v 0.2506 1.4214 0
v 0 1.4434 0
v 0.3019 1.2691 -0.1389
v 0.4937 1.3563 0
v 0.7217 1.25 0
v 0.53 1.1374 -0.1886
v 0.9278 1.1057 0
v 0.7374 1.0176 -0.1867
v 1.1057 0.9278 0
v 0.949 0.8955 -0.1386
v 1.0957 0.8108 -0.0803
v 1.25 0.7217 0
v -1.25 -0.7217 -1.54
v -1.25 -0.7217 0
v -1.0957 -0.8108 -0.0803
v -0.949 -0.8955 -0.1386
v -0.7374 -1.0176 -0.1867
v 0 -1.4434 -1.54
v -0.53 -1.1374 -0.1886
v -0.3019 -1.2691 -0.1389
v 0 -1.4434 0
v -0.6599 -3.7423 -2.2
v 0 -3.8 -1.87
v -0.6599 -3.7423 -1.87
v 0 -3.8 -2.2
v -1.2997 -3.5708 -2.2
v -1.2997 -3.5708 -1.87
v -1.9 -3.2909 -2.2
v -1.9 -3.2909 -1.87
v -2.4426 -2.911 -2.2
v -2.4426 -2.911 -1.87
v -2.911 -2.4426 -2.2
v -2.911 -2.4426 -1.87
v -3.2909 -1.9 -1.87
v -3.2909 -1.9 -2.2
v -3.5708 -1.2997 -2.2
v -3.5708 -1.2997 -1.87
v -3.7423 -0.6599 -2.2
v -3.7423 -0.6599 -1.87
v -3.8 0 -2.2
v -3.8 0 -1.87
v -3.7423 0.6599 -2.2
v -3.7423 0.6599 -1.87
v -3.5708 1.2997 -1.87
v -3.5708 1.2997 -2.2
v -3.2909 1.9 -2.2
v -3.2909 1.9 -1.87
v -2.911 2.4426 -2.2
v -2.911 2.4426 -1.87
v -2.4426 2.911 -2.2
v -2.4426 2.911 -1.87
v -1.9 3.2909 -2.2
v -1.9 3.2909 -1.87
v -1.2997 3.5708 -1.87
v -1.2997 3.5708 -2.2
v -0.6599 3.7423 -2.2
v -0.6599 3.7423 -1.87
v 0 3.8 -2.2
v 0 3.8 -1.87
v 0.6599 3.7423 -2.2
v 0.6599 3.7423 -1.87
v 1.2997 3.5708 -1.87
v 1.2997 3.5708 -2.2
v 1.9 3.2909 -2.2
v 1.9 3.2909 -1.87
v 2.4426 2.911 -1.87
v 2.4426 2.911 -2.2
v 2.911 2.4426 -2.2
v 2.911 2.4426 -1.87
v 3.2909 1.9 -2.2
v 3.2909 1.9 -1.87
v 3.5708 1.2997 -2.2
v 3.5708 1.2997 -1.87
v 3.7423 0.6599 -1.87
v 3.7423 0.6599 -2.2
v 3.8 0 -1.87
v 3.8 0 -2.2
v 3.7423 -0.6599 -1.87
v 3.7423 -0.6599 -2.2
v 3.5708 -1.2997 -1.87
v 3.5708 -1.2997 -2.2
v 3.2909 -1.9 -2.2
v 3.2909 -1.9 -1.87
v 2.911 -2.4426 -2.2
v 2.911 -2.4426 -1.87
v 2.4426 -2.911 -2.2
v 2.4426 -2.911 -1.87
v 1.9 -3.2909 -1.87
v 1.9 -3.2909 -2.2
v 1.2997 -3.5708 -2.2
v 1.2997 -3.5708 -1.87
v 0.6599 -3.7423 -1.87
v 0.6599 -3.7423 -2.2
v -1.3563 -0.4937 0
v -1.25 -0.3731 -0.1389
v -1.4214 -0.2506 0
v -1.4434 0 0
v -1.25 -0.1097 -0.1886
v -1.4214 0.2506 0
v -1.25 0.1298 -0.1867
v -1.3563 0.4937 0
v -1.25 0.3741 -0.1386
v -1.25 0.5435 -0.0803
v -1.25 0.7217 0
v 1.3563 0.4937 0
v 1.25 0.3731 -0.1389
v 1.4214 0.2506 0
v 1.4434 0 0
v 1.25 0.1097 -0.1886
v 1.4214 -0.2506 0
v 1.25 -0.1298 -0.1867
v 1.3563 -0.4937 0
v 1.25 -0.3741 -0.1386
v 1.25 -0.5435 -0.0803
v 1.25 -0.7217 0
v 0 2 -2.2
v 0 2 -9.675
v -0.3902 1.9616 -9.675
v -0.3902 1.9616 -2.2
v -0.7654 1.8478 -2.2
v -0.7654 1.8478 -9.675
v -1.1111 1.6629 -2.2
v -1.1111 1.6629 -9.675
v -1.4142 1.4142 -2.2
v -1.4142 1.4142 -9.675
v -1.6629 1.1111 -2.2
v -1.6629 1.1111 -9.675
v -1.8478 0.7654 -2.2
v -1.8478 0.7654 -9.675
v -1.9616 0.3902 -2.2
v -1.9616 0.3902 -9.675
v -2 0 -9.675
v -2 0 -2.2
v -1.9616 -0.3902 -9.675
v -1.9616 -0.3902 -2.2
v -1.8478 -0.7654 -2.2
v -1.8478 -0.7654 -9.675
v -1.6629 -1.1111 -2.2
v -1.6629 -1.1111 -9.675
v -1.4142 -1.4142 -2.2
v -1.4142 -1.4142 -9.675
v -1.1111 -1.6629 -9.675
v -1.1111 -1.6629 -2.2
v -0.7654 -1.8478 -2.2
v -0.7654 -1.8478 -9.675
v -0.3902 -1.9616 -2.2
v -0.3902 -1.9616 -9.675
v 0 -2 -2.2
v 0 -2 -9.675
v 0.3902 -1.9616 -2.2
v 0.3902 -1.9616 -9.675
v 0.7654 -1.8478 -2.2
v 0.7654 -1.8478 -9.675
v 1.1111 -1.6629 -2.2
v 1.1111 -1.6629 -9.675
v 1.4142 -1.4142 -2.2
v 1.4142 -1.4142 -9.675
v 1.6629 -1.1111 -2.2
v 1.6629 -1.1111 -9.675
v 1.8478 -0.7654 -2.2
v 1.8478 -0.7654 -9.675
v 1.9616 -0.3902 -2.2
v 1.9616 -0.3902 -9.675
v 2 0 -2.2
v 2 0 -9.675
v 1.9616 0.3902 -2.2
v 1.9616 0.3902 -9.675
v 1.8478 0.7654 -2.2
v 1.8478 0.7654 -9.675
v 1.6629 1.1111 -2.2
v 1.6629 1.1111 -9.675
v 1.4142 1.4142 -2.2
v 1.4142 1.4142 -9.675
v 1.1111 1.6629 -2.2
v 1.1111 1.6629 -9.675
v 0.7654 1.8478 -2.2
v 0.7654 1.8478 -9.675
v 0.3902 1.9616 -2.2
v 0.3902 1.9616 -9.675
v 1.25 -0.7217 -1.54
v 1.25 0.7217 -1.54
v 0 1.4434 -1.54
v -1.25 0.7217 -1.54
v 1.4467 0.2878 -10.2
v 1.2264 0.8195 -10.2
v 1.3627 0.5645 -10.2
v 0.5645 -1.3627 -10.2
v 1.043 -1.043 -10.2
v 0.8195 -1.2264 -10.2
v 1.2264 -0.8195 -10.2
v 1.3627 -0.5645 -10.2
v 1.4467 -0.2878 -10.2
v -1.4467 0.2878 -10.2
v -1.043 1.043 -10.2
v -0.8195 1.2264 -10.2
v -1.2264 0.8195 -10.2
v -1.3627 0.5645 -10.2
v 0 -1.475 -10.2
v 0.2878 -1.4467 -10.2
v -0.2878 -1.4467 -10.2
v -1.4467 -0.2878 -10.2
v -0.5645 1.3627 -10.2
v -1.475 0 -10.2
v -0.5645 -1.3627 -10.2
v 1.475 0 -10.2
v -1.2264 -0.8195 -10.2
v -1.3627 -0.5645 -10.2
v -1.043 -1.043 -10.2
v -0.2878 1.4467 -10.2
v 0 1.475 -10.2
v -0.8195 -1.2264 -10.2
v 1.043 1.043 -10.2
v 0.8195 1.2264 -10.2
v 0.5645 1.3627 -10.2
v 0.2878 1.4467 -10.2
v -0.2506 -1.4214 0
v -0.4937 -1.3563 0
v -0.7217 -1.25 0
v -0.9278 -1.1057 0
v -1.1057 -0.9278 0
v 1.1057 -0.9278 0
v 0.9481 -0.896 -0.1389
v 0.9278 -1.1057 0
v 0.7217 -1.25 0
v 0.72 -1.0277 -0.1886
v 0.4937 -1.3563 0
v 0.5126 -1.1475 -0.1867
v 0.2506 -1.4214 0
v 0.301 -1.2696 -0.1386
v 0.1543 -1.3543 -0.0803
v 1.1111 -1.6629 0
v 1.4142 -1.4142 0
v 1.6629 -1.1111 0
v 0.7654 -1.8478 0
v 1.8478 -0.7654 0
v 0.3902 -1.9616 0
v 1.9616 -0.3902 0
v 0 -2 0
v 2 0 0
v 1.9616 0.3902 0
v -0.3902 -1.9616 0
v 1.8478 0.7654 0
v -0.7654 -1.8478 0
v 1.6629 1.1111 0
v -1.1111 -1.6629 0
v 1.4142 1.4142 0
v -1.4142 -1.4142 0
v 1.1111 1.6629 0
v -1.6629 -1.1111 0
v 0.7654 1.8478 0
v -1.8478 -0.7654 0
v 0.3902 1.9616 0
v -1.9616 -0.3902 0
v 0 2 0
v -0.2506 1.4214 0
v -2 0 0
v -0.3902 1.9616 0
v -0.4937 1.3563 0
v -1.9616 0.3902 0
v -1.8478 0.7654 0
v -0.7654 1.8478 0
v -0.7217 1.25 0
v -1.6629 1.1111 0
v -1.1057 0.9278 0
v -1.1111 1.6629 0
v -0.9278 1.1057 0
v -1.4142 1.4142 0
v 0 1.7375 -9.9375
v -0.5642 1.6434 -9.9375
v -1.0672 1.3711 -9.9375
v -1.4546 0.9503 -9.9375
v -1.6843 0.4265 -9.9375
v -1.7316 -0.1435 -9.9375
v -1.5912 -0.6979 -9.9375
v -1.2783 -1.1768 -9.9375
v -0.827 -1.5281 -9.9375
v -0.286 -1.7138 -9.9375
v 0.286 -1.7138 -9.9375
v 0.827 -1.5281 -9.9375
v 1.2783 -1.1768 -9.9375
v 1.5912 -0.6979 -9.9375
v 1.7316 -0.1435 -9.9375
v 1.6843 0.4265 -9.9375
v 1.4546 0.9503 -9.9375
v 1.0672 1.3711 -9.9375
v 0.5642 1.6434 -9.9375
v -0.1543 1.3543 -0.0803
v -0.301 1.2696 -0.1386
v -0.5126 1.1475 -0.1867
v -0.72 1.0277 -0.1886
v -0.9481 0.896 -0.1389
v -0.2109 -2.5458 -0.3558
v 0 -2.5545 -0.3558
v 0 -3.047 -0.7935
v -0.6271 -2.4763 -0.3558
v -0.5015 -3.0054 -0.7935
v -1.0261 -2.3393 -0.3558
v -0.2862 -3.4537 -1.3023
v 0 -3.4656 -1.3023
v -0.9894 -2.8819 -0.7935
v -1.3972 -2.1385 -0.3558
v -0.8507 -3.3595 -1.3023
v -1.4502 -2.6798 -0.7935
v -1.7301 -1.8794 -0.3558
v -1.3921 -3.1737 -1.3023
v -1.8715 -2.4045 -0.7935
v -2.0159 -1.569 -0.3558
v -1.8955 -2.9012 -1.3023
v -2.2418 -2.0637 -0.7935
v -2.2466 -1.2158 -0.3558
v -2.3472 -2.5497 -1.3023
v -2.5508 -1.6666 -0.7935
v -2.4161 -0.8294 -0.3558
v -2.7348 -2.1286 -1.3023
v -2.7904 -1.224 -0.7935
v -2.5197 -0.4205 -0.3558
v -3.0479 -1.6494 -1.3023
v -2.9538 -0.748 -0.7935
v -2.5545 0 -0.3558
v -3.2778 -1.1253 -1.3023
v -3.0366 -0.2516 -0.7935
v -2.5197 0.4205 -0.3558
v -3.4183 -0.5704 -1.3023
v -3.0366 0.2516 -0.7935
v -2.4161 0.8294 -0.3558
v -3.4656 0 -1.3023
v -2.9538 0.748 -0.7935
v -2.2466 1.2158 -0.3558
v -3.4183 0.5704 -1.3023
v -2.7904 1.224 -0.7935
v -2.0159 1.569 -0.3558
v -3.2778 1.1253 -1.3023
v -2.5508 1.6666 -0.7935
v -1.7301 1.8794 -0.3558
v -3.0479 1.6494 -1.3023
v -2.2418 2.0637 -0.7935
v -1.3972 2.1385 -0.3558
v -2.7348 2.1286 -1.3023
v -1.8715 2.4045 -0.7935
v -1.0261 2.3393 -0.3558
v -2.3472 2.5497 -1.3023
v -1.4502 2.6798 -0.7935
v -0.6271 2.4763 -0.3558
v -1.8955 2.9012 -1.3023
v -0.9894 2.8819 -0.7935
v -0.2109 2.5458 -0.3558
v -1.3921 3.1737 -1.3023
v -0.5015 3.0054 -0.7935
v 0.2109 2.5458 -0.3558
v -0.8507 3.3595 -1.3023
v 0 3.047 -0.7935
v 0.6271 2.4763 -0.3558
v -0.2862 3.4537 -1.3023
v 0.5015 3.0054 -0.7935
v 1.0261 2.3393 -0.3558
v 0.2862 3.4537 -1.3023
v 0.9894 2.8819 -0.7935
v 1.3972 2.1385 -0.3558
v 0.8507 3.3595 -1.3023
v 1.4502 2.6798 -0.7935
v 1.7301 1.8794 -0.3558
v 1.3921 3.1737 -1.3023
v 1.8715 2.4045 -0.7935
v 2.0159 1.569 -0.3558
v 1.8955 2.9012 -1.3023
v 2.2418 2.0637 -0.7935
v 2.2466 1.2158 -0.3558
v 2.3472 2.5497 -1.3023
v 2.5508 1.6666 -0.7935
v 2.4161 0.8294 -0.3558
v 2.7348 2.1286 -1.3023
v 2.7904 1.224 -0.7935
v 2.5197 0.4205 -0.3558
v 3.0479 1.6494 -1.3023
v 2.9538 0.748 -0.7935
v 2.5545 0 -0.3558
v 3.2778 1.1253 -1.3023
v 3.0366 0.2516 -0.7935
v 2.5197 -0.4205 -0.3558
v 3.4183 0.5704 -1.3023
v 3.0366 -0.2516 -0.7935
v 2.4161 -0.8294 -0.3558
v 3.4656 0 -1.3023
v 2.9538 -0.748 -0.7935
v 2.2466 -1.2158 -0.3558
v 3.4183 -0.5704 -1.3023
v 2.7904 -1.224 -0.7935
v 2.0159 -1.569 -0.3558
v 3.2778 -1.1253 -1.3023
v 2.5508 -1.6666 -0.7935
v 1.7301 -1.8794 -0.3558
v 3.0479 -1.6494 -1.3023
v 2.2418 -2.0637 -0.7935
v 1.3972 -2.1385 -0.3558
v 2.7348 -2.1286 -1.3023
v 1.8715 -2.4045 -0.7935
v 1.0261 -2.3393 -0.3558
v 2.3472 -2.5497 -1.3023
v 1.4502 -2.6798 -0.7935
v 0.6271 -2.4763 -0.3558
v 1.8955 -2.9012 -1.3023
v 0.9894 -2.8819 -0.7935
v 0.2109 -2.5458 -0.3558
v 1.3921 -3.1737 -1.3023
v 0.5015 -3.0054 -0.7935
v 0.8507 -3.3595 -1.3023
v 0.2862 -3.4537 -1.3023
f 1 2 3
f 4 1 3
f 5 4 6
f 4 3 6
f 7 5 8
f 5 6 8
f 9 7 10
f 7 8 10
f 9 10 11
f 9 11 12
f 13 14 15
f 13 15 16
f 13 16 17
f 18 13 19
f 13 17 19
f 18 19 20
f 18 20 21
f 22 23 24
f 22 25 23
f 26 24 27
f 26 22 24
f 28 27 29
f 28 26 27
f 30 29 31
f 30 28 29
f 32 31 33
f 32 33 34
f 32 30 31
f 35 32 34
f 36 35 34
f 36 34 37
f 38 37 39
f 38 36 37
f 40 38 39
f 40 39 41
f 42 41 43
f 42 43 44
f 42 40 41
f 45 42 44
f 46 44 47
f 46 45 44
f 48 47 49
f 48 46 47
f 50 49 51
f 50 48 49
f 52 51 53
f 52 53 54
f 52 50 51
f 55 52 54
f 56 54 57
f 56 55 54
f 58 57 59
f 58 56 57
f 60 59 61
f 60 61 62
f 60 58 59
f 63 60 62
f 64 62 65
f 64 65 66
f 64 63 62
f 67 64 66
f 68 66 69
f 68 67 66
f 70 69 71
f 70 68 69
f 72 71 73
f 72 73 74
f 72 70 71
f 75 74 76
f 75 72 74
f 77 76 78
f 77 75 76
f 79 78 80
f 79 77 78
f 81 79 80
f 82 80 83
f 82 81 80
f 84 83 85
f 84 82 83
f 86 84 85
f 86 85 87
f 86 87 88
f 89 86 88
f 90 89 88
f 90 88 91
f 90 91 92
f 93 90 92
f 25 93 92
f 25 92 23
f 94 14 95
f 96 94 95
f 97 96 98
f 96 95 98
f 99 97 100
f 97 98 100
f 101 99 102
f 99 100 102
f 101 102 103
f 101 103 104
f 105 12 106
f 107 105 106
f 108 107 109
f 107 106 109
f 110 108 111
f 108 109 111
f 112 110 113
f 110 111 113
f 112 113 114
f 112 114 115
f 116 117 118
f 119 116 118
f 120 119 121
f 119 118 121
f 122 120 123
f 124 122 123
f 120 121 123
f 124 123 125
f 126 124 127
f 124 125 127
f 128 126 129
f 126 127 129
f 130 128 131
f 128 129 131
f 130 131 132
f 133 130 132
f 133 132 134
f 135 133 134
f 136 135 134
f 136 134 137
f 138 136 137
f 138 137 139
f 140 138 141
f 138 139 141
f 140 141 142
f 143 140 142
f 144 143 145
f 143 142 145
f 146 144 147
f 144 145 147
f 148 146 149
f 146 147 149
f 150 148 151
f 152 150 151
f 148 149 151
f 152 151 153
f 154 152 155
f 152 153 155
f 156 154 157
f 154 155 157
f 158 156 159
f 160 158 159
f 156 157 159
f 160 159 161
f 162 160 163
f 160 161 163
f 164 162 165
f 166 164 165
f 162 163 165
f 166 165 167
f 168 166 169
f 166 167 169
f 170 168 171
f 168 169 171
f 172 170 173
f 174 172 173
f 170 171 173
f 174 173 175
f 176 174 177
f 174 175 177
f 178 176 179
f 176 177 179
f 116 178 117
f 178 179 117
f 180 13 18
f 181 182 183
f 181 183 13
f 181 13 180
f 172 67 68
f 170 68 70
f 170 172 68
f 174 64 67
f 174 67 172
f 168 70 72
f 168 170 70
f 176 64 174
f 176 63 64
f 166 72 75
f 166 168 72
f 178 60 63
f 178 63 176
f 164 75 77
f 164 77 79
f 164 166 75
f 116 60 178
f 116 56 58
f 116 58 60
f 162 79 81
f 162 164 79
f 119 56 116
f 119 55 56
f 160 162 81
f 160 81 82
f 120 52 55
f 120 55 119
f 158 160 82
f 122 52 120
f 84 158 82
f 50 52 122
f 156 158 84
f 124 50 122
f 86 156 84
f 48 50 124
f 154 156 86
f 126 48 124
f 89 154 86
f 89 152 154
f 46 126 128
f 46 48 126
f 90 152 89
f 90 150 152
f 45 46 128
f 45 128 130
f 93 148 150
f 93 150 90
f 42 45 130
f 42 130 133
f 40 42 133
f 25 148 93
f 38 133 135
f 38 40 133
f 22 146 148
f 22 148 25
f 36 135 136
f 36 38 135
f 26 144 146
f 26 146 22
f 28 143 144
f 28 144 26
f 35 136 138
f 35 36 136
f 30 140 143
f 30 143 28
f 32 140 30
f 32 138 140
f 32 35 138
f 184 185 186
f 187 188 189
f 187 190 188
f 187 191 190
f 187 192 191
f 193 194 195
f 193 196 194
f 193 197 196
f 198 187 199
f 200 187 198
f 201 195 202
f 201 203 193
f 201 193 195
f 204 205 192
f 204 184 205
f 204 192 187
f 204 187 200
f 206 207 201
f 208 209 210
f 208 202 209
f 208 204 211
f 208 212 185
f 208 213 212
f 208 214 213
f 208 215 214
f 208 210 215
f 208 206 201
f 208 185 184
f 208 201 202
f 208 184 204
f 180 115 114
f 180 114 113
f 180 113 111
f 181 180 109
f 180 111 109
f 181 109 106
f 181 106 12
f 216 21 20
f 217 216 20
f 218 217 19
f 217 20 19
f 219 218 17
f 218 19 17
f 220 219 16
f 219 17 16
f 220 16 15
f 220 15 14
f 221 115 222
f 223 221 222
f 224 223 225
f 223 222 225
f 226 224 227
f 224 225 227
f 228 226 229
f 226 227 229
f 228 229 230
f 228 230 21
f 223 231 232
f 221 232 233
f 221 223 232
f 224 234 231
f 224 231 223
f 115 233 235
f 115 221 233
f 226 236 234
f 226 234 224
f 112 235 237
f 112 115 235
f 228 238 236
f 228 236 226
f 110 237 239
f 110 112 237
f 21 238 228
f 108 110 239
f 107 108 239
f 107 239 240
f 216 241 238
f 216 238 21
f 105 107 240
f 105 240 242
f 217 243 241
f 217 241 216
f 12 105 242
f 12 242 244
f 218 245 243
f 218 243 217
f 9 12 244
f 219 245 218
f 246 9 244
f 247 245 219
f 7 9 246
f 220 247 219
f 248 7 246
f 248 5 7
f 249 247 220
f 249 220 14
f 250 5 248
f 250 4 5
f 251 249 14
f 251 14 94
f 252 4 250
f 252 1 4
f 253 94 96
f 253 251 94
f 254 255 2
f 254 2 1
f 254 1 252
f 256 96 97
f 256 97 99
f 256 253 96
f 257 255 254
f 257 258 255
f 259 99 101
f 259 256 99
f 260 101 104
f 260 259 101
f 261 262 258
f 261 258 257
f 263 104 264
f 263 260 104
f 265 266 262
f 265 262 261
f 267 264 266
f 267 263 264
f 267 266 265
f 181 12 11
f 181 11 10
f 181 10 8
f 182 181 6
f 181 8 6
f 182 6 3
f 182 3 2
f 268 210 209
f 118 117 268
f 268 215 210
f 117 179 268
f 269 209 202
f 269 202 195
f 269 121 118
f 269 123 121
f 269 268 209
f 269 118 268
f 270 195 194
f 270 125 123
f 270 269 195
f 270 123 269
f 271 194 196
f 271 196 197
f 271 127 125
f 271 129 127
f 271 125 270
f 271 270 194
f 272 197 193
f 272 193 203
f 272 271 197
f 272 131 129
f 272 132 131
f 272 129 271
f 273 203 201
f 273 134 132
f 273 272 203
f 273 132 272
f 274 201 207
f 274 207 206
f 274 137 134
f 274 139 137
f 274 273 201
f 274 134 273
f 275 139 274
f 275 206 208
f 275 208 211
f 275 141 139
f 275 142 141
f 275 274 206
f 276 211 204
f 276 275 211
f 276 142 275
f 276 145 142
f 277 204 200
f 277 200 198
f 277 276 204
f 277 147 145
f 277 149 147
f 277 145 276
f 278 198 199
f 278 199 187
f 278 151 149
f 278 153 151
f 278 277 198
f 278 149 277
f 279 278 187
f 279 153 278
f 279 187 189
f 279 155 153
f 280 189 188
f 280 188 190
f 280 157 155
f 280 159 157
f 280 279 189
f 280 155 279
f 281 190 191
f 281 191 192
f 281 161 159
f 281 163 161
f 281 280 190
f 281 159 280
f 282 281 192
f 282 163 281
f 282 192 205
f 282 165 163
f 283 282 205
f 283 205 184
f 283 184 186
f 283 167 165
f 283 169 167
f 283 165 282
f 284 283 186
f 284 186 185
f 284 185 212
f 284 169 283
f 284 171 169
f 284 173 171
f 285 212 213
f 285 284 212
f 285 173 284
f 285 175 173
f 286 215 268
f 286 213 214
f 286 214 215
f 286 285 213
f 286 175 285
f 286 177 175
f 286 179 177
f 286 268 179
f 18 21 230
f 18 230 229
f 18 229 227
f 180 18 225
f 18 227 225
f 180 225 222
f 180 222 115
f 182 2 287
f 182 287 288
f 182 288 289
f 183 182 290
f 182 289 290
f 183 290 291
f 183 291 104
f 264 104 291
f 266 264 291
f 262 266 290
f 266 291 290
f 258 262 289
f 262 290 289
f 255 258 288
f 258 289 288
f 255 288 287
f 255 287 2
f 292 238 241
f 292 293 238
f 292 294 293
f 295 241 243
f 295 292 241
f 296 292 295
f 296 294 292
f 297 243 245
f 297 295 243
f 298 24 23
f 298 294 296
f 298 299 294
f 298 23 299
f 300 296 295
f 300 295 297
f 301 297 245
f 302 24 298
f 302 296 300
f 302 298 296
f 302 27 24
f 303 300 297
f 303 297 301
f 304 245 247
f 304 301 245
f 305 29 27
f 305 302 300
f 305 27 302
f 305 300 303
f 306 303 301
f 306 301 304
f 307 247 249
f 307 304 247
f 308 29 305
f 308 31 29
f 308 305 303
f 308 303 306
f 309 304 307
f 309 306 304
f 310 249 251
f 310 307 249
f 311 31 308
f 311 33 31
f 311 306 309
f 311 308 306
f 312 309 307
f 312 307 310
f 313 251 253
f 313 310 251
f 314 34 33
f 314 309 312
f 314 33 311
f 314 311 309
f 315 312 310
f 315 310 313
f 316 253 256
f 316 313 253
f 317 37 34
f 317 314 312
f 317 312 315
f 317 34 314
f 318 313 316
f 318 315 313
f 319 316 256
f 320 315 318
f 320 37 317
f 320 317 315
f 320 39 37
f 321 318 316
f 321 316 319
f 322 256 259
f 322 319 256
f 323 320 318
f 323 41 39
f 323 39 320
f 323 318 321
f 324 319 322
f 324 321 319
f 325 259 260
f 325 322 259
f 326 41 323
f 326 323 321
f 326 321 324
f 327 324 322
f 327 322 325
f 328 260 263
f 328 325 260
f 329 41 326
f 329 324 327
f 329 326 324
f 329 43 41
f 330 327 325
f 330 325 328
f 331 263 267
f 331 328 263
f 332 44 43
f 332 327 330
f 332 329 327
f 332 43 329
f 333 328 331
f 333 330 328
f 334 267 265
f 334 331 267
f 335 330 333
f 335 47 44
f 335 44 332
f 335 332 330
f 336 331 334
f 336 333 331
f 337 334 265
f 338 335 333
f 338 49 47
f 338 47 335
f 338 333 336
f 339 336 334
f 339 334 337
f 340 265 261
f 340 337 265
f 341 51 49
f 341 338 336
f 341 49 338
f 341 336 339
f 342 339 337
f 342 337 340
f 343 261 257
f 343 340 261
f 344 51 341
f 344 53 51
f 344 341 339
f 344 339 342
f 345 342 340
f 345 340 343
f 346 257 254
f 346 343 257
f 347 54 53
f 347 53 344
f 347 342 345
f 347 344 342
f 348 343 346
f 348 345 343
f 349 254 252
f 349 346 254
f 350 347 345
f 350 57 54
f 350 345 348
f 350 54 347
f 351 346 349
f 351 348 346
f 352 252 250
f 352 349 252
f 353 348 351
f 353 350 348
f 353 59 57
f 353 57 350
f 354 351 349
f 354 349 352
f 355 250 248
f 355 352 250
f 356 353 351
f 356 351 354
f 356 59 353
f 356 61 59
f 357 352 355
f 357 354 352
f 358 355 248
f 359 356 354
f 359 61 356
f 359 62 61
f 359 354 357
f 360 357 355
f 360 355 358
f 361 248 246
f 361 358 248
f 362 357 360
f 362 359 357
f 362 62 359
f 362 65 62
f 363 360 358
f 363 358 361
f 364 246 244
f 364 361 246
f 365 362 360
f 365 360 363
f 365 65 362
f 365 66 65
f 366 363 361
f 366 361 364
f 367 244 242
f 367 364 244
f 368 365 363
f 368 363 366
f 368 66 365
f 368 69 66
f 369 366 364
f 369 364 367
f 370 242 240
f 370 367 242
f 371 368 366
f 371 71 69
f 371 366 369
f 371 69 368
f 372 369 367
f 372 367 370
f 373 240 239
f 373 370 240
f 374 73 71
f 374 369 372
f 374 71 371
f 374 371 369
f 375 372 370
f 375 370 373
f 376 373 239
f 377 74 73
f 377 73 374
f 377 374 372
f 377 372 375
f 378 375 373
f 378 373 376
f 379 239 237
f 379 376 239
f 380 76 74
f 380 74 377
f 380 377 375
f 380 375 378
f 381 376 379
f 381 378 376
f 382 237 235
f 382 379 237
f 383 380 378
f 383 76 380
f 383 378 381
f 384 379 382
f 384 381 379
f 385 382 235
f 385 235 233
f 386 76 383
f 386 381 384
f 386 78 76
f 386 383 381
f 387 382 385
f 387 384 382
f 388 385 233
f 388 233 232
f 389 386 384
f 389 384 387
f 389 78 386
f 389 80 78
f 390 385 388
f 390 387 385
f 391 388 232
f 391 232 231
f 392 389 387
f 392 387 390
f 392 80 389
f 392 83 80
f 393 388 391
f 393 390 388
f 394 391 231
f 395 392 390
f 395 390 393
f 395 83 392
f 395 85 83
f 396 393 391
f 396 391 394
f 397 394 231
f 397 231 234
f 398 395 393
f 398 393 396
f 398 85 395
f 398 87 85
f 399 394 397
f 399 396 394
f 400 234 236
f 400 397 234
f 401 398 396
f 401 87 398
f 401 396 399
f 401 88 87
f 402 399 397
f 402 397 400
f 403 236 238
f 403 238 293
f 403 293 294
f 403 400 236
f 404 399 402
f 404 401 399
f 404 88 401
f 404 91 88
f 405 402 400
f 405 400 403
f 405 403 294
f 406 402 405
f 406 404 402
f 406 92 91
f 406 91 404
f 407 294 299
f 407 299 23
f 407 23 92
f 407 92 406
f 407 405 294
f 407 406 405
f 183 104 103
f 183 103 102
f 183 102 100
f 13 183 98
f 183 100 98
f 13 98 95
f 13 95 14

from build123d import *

# Parameters (mm, degrees)
SKETCH1_W          = 8
SKETCH1_H          = 2
CHAMFER1_SIZE      = 0.525
CUT_EXTRUDE2_DEPTH = 1.54


with BuildPart() as part:
    # Sketch1 → Revolve1 (revolve)
    with BuildSketch(Plane(origin=(0, 0, 0), x_dir=(0, 0, -1), z_dir=(1, 0, 0))):
        with Locations((6.2, 1)):
            Rectangle(SKETCH1_W, SKETCH1_H)
    revolve(axis=Axis((0, 0, -10.2), (0, 0, 1)))

    # Chamfer1
    chamfer1_edges = [part.edges().sort_by_distance(p)[0] for p in [
        (0, -2, -10.2),
    ]]
    chamfer(chamfer1_edges, length=CHAMFER1_SIZE)

    # Sketch7 → Revolve2 (revolve)
    with BuildSketch(Plane(origin=(0, 0, 0), x_dir=(0, 0, -1), z_dir=(1, 0, 0))):
        with BuildLine():
            Line((1.87, 3.8), (2.2, 3.8))
            Line((2.2, 3.8), (2.2, 0))
            Line((2.2, 0), (0, 0))
            Line((0, 0), (0, 2))
            ThreePointArc((0, 2), (0.793500147, 3.047002626), (1.87, 3.8))
        make_face()
    revolve(axis=Axis((0, 0, 0), (0, 0, -1)))

    # Sketch5 → Cut-Extrude2 (cut)
    with BuildSketch(Plane.XY):
        Polygon((1.25, -0.721687836), (1.25, 0.721687836), (0, 1.443375673), (-1.25, 0.721687836), (-1.25, -0.721687836), (0, -1.443375673), align=None)
    extrude(amount=-CUT_EXTRUDE2_DEPTH, mode=Mode.SUBTRACT)

    # Cut-Extrude3 cone 1 section (through the dimple's axis) → Cut-Extrude3 (revolve, cut)
    with BuildSketch(Plane(origin=(0, 0, 0), x_dir=(0, -1, 0), z_dir=(1, 0, 0))):
        Polygon((0, 0), (1.443375673, 0), (0, 1.443375673), align=None)
    revolve(axis=Axis((0, 0, 0), (0, 0, -1)), mode=Mode.SUBTRACT)


solid = part.part
